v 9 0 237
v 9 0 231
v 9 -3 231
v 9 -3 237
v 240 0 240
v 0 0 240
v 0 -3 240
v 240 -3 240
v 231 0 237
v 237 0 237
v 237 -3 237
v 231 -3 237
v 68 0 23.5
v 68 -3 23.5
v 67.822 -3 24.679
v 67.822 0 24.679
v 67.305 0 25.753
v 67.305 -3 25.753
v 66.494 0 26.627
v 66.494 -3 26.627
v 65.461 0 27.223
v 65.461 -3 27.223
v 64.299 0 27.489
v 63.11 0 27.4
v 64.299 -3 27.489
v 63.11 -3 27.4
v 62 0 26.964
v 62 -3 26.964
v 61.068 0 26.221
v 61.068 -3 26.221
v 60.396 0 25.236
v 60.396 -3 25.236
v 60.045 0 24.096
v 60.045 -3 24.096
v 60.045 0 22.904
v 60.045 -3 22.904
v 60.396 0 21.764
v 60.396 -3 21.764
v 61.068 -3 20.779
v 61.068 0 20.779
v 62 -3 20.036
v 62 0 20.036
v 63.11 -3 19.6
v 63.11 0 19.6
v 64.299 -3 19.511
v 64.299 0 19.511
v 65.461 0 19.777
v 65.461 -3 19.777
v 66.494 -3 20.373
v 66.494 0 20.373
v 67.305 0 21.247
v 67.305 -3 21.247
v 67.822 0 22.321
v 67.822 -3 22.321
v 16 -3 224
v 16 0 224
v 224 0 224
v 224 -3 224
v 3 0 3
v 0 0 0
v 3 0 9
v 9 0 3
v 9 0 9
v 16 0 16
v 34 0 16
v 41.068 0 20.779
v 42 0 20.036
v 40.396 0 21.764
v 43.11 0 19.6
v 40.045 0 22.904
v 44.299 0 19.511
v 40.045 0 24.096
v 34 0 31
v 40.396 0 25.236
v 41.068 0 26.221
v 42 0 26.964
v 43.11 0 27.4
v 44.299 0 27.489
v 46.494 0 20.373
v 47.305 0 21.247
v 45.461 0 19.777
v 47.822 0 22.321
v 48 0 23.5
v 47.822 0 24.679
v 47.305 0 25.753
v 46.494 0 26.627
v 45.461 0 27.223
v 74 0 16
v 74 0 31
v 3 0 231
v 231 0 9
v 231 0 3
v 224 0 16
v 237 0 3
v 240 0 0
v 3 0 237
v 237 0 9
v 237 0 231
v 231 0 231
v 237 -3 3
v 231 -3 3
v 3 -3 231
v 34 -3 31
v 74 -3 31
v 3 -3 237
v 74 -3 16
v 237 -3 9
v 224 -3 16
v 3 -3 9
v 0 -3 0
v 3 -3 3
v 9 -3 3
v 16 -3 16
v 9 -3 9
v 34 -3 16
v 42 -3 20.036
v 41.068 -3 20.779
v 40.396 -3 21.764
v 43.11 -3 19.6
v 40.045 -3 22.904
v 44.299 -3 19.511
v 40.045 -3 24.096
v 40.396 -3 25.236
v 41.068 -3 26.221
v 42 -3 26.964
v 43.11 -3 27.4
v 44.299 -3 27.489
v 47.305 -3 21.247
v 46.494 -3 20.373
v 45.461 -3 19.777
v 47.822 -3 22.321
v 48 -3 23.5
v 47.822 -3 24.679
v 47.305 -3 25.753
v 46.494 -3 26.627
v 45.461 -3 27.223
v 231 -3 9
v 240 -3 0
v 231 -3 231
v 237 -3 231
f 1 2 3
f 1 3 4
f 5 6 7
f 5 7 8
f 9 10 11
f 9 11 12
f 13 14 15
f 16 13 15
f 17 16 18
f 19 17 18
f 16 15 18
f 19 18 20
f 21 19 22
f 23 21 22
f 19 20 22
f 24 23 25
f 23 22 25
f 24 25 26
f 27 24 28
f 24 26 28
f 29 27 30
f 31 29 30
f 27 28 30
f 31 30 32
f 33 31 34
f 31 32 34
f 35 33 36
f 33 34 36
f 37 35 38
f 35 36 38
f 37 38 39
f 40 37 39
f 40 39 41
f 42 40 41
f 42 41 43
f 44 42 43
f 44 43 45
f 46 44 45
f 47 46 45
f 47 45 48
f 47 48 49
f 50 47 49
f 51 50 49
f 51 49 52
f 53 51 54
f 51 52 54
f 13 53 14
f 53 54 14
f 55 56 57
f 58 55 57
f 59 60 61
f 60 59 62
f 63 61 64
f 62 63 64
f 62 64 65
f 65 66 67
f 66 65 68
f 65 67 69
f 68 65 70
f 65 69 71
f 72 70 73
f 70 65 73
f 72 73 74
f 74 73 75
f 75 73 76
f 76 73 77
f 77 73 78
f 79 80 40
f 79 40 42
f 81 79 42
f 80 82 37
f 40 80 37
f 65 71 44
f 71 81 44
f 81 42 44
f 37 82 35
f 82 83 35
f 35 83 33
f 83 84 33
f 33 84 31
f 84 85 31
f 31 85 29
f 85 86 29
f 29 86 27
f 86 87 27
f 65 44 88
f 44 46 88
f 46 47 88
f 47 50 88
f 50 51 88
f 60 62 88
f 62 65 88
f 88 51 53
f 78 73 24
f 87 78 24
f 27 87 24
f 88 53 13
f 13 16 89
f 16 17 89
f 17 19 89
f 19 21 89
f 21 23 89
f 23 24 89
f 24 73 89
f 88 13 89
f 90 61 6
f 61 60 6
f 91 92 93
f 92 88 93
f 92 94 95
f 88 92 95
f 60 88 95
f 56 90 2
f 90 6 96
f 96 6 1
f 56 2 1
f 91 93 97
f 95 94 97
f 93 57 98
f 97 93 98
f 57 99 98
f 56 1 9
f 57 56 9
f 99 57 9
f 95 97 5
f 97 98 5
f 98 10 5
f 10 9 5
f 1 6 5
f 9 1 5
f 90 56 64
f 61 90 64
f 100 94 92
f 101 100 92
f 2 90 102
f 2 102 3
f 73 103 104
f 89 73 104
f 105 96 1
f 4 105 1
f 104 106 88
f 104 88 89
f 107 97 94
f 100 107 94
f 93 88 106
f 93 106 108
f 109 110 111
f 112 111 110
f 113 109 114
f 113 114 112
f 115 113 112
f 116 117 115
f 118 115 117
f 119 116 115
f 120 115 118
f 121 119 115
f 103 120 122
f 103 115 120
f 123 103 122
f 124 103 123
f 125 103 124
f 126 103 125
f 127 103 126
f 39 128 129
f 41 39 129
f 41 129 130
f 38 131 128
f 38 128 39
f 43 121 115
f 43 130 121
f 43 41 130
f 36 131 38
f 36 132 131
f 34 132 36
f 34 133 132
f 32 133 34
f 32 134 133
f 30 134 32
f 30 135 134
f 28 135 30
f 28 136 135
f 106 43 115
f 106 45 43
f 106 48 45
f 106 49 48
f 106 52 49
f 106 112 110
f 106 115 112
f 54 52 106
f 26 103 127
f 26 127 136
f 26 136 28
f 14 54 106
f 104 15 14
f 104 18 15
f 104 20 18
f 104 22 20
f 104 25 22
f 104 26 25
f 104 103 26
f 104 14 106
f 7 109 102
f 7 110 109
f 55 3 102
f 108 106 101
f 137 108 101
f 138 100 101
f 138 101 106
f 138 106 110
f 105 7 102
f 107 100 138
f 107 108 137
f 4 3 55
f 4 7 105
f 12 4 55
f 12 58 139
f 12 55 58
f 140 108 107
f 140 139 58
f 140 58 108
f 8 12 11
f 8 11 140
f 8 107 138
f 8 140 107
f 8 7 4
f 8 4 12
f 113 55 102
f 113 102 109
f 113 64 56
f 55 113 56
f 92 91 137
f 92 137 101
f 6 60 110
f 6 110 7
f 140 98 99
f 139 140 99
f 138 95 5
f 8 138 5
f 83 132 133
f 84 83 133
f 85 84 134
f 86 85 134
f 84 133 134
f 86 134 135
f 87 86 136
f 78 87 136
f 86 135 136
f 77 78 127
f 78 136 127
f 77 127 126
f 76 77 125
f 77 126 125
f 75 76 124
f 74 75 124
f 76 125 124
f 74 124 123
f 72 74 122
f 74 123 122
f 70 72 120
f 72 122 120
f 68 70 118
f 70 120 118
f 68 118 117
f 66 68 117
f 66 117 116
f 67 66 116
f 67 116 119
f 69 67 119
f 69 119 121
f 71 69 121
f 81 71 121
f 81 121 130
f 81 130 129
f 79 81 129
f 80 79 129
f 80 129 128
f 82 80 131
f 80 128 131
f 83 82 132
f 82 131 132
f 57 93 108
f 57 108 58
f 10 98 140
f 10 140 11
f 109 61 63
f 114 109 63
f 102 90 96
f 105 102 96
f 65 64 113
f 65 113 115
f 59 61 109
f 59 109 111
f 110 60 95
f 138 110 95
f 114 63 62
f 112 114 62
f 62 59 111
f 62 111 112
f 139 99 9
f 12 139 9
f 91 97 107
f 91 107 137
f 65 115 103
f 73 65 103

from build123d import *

# Parameters (mm, degrees)
F1_W     = 240
F1_H     = 240
F1_W_2   = 6
F1_H_2   = 6
F1_W_3   = 208
F1_H_3   = 208
F2_DEPTH = 3
F3_DEPTH = 25
F8_W     = 40
F8_H     = 15
F8_R     = 4
F9_DEPTH = 3


with BuildPart() as f2:
    # F1 (on Front) → F2 (new body)
    with BuildSketch(Plane.XZ):
        with Locations((120, 120)):
            Rectangle(F1_W, F1_H)
        with Locations((6, 234)):
            Rectangle(F1_W_2, F1_H_2, mode=Mode.SUBTRACT)
        with Locations((120, 120)):
            Rectangle(F1_W_3, F1_H_3, mode=Mode.SUBTRACT)
        with Locations((6, 234)):
            Rectangle(F1_W_2, F1_H_2)
    extrude(amount=F2_DEPTH)

    # F1 (on Front) → F3 (cut)
    with BuildSketch(Plane.XZ):
        with Locations((6, 234)):
            Rectangle(F1_W_2, F1_H_2)
    extrude(amount=F3_DEPTH, mode=Mode.SUBTRACT)

    # F5: F2 across plane


with BuildPart() as f2_1:
    add(f2.part)
    add(f2.part.mirror(Plane(origin=(120, -1.5, 120), x_dir=(0, -1, 0), z_dir=(-1, 0, 0))), mode=Mode.INTERSECT)

    # F7: F2 across plane


with BuildPart() as f2_2:
    add(f2_1.part)
    add(f2_1.part.mirror(Plane(origin=(120, -1.5, 120), x_dir=(1, 0, 0), z_dir=(0, 0, 1))), mode=Mode.INTERSECT)

    # F8 (on face) → F9 (join)
    with BuildSketch(Plane.XZ.offset(3)):
        with Locations((54, 23.5)):
            Rectangle(F8_W, F8_H)
        with Locations((44, 23.5)):
            Circle(F8_R, mode=Mode.SUBTRACT)
        with Locations((64, 23.5)):
            Circle(F8_R, mode=Mode.SUBTRACT)
    extrude(amount=-F9_DEPTH)


solid = f2_2.part
